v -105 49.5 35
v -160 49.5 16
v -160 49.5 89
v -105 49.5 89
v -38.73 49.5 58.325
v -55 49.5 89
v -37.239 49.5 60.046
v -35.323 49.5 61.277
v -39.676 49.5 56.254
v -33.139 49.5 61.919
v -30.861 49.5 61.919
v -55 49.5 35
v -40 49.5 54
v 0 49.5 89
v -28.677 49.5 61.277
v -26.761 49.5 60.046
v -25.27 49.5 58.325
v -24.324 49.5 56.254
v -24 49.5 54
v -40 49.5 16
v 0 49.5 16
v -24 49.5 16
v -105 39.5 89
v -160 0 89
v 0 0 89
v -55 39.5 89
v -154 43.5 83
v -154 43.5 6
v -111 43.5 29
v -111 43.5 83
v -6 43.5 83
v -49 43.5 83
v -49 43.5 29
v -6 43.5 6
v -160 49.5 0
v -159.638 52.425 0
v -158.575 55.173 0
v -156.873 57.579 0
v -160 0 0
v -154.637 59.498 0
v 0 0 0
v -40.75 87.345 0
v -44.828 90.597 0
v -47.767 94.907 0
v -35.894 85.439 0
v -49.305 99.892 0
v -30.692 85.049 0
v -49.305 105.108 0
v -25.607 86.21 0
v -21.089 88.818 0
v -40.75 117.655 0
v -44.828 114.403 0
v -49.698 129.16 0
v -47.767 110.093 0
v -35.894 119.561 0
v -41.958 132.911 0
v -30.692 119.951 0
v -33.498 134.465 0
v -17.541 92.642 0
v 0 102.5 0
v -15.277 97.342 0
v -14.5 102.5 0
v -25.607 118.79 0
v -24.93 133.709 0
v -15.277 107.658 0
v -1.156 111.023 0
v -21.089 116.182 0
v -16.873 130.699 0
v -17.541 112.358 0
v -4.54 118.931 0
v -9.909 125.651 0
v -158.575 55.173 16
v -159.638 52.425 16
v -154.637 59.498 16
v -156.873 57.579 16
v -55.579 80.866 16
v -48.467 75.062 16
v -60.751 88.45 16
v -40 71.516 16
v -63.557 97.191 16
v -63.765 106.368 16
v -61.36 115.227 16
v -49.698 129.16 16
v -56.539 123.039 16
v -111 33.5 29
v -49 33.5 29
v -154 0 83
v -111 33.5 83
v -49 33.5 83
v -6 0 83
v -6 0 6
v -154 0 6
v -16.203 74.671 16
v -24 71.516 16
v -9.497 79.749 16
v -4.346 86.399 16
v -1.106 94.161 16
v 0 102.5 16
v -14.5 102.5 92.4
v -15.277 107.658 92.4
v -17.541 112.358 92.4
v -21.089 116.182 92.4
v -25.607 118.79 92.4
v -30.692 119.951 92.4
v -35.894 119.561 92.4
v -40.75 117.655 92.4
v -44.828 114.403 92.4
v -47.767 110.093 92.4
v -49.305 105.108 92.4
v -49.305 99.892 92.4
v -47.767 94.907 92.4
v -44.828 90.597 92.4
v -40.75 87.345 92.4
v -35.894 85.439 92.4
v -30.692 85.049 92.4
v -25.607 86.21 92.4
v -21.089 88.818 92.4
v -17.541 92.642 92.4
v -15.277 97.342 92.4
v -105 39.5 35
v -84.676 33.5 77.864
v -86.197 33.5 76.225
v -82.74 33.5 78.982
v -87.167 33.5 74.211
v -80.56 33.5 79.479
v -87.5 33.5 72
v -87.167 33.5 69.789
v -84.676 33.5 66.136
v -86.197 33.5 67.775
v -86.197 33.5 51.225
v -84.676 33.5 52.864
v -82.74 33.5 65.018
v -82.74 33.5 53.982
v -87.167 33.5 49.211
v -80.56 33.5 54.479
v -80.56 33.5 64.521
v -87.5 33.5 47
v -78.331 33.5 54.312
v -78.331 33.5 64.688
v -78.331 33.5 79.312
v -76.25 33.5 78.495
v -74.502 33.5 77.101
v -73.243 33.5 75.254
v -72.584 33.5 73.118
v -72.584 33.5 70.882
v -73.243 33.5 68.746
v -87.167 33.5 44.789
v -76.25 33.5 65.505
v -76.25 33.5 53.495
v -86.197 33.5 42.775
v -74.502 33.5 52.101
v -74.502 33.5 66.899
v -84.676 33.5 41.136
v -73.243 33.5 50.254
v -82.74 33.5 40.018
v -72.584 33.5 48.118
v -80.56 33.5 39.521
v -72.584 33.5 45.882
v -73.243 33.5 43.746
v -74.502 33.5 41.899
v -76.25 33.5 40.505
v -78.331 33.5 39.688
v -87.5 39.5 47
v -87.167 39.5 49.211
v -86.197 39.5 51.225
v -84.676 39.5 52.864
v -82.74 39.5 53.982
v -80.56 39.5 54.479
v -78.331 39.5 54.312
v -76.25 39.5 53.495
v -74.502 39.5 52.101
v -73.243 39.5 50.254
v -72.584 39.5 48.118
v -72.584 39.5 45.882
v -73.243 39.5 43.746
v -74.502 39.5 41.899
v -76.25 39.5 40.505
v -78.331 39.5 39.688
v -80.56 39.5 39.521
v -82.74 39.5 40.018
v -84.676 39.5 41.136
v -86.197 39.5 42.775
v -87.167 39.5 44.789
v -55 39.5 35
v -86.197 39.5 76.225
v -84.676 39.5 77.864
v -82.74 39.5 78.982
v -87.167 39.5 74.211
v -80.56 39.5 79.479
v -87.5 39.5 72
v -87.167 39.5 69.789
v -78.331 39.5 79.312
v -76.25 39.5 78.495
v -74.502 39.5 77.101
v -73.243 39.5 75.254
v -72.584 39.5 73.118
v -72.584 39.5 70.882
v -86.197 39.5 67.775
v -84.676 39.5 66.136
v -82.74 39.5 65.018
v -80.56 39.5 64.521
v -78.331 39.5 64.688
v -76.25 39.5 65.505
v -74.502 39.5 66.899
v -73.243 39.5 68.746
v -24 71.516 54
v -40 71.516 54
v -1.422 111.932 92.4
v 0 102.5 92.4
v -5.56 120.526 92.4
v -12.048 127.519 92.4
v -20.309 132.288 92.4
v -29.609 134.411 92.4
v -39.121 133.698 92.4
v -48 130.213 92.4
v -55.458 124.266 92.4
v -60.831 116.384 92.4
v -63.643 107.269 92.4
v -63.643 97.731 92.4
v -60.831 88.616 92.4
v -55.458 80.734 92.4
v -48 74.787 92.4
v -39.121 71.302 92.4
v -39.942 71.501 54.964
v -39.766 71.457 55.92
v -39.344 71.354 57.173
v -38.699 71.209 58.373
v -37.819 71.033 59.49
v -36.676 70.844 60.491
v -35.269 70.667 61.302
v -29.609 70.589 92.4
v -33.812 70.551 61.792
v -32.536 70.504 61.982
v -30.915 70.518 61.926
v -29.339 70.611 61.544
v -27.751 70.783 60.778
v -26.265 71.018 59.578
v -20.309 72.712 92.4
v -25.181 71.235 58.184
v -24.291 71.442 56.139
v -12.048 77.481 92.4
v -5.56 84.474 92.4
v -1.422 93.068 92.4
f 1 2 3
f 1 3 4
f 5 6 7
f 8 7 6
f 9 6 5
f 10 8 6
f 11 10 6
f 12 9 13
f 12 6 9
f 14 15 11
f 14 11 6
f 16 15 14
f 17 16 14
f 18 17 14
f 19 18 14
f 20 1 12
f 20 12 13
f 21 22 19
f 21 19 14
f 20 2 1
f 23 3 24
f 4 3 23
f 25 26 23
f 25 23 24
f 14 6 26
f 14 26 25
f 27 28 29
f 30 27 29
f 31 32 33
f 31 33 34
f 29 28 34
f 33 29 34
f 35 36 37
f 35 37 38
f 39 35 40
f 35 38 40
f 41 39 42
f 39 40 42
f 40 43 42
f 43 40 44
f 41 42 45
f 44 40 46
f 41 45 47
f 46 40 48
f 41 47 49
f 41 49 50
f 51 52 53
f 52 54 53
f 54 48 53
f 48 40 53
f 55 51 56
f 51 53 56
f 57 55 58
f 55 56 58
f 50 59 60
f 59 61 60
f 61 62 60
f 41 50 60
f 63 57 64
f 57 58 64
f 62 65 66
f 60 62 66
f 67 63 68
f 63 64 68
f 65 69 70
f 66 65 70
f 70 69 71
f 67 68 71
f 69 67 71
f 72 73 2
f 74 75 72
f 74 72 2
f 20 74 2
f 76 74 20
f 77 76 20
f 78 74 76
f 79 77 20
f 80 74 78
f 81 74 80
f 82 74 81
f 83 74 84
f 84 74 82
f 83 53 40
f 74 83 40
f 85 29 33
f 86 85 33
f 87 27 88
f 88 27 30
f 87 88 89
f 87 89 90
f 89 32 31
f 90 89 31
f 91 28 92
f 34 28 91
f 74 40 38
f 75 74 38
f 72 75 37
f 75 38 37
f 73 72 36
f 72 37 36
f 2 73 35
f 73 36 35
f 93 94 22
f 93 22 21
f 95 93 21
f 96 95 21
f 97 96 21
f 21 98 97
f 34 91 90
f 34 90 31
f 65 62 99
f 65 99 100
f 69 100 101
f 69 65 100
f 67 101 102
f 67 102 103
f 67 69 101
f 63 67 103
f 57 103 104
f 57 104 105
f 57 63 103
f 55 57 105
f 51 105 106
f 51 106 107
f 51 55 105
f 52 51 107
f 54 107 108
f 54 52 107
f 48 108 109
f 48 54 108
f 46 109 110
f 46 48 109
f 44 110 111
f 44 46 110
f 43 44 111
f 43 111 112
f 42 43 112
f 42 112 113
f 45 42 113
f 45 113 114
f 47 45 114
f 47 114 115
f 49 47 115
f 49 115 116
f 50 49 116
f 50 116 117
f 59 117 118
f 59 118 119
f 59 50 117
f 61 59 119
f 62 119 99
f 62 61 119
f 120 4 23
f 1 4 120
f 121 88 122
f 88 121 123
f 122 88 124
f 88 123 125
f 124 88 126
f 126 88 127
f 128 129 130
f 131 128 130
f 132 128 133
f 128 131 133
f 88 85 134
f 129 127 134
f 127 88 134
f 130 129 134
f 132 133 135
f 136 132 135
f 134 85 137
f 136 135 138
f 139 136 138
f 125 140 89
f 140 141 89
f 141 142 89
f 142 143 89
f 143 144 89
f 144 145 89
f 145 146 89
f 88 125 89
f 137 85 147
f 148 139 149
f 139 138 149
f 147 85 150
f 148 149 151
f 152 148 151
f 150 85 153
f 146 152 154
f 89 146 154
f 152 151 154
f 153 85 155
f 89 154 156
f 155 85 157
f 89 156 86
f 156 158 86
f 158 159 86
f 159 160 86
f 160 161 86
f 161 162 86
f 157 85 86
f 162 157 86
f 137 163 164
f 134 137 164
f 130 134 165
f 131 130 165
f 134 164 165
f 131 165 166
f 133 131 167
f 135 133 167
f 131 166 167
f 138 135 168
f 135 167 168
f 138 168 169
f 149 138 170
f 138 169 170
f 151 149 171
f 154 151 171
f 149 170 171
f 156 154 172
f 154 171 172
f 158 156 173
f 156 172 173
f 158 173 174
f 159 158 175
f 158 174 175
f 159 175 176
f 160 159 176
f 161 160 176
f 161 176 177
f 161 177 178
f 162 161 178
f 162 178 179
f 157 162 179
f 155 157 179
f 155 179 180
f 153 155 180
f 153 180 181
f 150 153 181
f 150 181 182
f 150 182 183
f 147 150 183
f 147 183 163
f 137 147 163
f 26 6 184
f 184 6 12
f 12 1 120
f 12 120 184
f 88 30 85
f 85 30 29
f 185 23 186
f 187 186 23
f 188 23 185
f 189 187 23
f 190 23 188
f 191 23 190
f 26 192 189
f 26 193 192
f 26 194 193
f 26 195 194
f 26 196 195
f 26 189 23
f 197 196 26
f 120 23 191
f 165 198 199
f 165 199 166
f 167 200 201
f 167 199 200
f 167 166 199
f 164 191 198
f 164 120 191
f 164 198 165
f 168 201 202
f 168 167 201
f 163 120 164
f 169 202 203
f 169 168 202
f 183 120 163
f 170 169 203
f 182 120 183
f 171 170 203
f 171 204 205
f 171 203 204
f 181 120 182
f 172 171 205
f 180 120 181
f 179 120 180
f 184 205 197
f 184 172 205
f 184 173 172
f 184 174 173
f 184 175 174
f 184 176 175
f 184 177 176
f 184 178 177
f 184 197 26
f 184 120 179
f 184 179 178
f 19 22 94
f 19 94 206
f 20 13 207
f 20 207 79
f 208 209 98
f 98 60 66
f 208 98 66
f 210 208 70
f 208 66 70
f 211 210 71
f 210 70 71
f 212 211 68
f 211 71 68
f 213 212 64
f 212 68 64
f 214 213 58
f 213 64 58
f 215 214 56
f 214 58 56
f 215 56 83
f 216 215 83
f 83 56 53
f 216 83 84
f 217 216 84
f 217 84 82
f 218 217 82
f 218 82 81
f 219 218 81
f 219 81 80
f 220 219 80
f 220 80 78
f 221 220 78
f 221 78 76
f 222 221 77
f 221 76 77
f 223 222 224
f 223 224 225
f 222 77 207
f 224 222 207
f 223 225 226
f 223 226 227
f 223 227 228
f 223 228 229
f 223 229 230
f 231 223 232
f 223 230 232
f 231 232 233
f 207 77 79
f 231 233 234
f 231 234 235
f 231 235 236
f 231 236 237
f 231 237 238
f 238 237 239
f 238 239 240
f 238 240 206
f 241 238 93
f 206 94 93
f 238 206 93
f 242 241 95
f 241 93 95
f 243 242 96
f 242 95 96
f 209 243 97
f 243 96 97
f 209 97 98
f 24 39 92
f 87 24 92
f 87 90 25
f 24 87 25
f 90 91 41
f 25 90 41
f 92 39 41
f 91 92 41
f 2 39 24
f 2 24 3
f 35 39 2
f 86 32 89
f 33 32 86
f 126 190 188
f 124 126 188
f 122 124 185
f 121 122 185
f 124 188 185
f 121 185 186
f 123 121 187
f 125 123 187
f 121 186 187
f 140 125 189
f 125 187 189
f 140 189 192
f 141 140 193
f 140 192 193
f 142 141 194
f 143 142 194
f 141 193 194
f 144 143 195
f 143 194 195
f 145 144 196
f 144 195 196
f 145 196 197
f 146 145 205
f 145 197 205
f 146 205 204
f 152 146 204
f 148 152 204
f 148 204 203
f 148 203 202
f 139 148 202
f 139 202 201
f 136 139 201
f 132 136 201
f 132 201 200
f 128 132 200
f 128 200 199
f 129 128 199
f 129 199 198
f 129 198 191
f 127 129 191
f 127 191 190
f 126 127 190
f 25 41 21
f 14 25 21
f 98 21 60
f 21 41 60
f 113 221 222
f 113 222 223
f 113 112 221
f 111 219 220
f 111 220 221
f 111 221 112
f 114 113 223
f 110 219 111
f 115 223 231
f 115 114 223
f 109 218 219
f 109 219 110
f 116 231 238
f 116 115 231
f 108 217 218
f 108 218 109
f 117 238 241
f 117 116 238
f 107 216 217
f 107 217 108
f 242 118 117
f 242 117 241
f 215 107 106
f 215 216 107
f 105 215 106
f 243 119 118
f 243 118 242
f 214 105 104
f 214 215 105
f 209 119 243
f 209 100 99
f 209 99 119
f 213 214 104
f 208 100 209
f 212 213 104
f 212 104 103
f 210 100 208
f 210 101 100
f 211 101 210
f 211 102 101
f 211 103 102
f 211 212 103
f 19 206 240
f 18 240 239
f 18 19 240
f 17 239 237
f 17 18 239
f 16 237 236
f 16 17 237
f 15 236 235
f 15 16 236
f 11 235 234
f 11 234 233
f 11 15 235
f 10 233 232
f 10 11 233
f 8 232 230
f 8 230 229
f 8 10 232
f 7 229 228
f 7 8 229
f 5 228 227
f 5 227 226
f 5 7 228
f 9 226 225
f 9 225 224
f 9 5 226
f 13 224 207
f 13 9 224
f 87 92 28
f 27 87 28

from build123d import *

# Parameters (mm, degrees)
SKETCH1_W                = 160
SKETCH1_H                = 49.5
BOSS_EXTRUDE1_DEPTH      = 89
BOSS_EXTRUDE2_DEPTH      = 16
SKETCH2_W                = 50
SKETCH2_H                = 54
SKETCH2_R                = 7.5
CUT_EXTRUDE1_DEPTH       = 10
SHELL2_T                 = -6
SKETCH1_4_R              = 32
SKETCH1_4_R_2            = 17.5
BOSS_EXTRUDE3_DEPTH      = 92.4
BOSS_EXTRUDE4_REACH      = 205.378
BOSS_EXTRUDE4_END_RADIUS = 32
SKETCH2_8_R              = 7.5
CUT_EXTRUDE4_DEPTH       = 204.378366598


with BuildPart() as part:
    # Sketch1 → Boss-Extrude1 (new body)
    with BuildSketch(Plane.XY):
        with Locations((-80, 24.75)):
            Rectangle(SKETCH1_W, SKETCH1_H)
    extrude(amount=BOSS_EXTRUDE1_DEPTH)

    # Sketch2 → Cut-Extrude1 (cut)
    with BuildSketch(Plane(origin=(0, 49.5, 0), x_dir=(1, 0, 0), z_dir=(0, 1, 0))):
        with Locations((-80, -62)):
            Rectangle(SKETCH2_W, SKETCH2_H)
        with Locations(Location((-80, -72, 0), (0, 0, 180))):
            Circle(SKETCH2_R, mode=Mode.SUBTRACT)
        with Locations(Location((-80, -47, 0), (0, 0, 180))):
            Circle(SKETCH2_R, mode=Mode.SUBTRACT)
    extrude(amount=-CUT_EXTRUDE1_DEPTH, mode=Mode.SUBTRACT)

    # Shell2
    shell2_openings = [part.faces().sort_by_distance(p)[0] for p in [
        (-80, 0, 44.5),
    ]]
    offset(amount=SHELL2_T, openings=shell2_openings, kind=Kind.INTERSECTION)

    # Boss-Extrude4: up to this cylinder (the profile starts outside it)
    boss_extrude4_end = Plane(origin=(-32, 102.5, 38.177591), z_dir=(0, 0, -1)) * Cylinder(BOSS_EXTRUDE4_END_RADIUS, 475.756, mode=Mode.PRIVATE)
    # Sketch2<6> → Boss-Extrude4 (add, up to the surface)
    with BuildSketch(Plane(origin=(0, 49.5, 0), x_dir=(1, 0, 0), z_dir=(0, 1, 0)), mode=Mode.PRIVATE) as boss_extrude4_sk1:
        with BuildLine():
            Line((-40, -16), (-24, -16))
            Line((-24, -16), (-24, -54))
            ThreePointArc((-24, -54), (-32, -62), (-40, -54))
            Line((-40, -54), (-40, -16))
        make_face()
    boss_extrude4_tool1 = extrude(boss_extrude4_sk1.sketch, amount=BOSS_EXTRUDE4_REACH, mode=Mode.PRIVATE) - boss_extrude4_end
    add(boss_extrude4_tool1.solids().sort_by_distance((-32, 49.5, 38.177591))[0])

    # Sketch2<8> → Cut-Extrude4 (cut, through all)
    with BuildSketch(Plane(origin=(0, 49.5, 0), x_dir=(1, 0, 0), z_dir=(0, 1, 0))):
        with Locations(Location((-80, -47, 0), (0, 0, 180))):
            Circle(SKETCH2_8_R)
        with Locations(Location((-80, -72, 0), (0, 0, 180))):
            Circle(SKETCH2_8_R)
    extrude(amount=-CUT_EXTRUDE4_DEPTH, mode=Mode.SUBTRACT)


with BuildPart() as body_2:
    # Sketch1<3> → Boss-Extrude2 (new body)
    with BuildSketch(Plane.XY):
        with BuildLine():
            Line((-160, 49.5), (0, 49.5))
            Line((0, 49.5), (0, 102.5))
            ThreePointArc((0, 102.5), (-47.127064471, 74.301207109), (-49.698245031, 129.160309879))
            Line((-49.698245031, 129.160309879), (-154.636841887, 59.497616205))
            ThreePointArc((-154.636841887, 59.497616205), (-158.574547334, 55.172649177), (-160, 49.5))
        make_face()
    extrude(amount=BOSS_EXTRUDE2_DEPTH)


with BuildPart() as body_3:
    # Sketch1<4> → Boss-Extrude3 (new body)
    with BuildSketch(Plane.XY):
        with Locations((-32, 102.5)):
            Circle(SKETCH1_4_R)
        with Locations((-32, 102.5)):
            Circle(SKETCH1_4_R_2, mode=Mode.SUBTRACT)
    extrude(amount=BOSS_EXTRUDE3_DEPTH)

    # Combine1: union part, body 2
    add(part.part)
    add(body_2.part)


solid = body_3.part
